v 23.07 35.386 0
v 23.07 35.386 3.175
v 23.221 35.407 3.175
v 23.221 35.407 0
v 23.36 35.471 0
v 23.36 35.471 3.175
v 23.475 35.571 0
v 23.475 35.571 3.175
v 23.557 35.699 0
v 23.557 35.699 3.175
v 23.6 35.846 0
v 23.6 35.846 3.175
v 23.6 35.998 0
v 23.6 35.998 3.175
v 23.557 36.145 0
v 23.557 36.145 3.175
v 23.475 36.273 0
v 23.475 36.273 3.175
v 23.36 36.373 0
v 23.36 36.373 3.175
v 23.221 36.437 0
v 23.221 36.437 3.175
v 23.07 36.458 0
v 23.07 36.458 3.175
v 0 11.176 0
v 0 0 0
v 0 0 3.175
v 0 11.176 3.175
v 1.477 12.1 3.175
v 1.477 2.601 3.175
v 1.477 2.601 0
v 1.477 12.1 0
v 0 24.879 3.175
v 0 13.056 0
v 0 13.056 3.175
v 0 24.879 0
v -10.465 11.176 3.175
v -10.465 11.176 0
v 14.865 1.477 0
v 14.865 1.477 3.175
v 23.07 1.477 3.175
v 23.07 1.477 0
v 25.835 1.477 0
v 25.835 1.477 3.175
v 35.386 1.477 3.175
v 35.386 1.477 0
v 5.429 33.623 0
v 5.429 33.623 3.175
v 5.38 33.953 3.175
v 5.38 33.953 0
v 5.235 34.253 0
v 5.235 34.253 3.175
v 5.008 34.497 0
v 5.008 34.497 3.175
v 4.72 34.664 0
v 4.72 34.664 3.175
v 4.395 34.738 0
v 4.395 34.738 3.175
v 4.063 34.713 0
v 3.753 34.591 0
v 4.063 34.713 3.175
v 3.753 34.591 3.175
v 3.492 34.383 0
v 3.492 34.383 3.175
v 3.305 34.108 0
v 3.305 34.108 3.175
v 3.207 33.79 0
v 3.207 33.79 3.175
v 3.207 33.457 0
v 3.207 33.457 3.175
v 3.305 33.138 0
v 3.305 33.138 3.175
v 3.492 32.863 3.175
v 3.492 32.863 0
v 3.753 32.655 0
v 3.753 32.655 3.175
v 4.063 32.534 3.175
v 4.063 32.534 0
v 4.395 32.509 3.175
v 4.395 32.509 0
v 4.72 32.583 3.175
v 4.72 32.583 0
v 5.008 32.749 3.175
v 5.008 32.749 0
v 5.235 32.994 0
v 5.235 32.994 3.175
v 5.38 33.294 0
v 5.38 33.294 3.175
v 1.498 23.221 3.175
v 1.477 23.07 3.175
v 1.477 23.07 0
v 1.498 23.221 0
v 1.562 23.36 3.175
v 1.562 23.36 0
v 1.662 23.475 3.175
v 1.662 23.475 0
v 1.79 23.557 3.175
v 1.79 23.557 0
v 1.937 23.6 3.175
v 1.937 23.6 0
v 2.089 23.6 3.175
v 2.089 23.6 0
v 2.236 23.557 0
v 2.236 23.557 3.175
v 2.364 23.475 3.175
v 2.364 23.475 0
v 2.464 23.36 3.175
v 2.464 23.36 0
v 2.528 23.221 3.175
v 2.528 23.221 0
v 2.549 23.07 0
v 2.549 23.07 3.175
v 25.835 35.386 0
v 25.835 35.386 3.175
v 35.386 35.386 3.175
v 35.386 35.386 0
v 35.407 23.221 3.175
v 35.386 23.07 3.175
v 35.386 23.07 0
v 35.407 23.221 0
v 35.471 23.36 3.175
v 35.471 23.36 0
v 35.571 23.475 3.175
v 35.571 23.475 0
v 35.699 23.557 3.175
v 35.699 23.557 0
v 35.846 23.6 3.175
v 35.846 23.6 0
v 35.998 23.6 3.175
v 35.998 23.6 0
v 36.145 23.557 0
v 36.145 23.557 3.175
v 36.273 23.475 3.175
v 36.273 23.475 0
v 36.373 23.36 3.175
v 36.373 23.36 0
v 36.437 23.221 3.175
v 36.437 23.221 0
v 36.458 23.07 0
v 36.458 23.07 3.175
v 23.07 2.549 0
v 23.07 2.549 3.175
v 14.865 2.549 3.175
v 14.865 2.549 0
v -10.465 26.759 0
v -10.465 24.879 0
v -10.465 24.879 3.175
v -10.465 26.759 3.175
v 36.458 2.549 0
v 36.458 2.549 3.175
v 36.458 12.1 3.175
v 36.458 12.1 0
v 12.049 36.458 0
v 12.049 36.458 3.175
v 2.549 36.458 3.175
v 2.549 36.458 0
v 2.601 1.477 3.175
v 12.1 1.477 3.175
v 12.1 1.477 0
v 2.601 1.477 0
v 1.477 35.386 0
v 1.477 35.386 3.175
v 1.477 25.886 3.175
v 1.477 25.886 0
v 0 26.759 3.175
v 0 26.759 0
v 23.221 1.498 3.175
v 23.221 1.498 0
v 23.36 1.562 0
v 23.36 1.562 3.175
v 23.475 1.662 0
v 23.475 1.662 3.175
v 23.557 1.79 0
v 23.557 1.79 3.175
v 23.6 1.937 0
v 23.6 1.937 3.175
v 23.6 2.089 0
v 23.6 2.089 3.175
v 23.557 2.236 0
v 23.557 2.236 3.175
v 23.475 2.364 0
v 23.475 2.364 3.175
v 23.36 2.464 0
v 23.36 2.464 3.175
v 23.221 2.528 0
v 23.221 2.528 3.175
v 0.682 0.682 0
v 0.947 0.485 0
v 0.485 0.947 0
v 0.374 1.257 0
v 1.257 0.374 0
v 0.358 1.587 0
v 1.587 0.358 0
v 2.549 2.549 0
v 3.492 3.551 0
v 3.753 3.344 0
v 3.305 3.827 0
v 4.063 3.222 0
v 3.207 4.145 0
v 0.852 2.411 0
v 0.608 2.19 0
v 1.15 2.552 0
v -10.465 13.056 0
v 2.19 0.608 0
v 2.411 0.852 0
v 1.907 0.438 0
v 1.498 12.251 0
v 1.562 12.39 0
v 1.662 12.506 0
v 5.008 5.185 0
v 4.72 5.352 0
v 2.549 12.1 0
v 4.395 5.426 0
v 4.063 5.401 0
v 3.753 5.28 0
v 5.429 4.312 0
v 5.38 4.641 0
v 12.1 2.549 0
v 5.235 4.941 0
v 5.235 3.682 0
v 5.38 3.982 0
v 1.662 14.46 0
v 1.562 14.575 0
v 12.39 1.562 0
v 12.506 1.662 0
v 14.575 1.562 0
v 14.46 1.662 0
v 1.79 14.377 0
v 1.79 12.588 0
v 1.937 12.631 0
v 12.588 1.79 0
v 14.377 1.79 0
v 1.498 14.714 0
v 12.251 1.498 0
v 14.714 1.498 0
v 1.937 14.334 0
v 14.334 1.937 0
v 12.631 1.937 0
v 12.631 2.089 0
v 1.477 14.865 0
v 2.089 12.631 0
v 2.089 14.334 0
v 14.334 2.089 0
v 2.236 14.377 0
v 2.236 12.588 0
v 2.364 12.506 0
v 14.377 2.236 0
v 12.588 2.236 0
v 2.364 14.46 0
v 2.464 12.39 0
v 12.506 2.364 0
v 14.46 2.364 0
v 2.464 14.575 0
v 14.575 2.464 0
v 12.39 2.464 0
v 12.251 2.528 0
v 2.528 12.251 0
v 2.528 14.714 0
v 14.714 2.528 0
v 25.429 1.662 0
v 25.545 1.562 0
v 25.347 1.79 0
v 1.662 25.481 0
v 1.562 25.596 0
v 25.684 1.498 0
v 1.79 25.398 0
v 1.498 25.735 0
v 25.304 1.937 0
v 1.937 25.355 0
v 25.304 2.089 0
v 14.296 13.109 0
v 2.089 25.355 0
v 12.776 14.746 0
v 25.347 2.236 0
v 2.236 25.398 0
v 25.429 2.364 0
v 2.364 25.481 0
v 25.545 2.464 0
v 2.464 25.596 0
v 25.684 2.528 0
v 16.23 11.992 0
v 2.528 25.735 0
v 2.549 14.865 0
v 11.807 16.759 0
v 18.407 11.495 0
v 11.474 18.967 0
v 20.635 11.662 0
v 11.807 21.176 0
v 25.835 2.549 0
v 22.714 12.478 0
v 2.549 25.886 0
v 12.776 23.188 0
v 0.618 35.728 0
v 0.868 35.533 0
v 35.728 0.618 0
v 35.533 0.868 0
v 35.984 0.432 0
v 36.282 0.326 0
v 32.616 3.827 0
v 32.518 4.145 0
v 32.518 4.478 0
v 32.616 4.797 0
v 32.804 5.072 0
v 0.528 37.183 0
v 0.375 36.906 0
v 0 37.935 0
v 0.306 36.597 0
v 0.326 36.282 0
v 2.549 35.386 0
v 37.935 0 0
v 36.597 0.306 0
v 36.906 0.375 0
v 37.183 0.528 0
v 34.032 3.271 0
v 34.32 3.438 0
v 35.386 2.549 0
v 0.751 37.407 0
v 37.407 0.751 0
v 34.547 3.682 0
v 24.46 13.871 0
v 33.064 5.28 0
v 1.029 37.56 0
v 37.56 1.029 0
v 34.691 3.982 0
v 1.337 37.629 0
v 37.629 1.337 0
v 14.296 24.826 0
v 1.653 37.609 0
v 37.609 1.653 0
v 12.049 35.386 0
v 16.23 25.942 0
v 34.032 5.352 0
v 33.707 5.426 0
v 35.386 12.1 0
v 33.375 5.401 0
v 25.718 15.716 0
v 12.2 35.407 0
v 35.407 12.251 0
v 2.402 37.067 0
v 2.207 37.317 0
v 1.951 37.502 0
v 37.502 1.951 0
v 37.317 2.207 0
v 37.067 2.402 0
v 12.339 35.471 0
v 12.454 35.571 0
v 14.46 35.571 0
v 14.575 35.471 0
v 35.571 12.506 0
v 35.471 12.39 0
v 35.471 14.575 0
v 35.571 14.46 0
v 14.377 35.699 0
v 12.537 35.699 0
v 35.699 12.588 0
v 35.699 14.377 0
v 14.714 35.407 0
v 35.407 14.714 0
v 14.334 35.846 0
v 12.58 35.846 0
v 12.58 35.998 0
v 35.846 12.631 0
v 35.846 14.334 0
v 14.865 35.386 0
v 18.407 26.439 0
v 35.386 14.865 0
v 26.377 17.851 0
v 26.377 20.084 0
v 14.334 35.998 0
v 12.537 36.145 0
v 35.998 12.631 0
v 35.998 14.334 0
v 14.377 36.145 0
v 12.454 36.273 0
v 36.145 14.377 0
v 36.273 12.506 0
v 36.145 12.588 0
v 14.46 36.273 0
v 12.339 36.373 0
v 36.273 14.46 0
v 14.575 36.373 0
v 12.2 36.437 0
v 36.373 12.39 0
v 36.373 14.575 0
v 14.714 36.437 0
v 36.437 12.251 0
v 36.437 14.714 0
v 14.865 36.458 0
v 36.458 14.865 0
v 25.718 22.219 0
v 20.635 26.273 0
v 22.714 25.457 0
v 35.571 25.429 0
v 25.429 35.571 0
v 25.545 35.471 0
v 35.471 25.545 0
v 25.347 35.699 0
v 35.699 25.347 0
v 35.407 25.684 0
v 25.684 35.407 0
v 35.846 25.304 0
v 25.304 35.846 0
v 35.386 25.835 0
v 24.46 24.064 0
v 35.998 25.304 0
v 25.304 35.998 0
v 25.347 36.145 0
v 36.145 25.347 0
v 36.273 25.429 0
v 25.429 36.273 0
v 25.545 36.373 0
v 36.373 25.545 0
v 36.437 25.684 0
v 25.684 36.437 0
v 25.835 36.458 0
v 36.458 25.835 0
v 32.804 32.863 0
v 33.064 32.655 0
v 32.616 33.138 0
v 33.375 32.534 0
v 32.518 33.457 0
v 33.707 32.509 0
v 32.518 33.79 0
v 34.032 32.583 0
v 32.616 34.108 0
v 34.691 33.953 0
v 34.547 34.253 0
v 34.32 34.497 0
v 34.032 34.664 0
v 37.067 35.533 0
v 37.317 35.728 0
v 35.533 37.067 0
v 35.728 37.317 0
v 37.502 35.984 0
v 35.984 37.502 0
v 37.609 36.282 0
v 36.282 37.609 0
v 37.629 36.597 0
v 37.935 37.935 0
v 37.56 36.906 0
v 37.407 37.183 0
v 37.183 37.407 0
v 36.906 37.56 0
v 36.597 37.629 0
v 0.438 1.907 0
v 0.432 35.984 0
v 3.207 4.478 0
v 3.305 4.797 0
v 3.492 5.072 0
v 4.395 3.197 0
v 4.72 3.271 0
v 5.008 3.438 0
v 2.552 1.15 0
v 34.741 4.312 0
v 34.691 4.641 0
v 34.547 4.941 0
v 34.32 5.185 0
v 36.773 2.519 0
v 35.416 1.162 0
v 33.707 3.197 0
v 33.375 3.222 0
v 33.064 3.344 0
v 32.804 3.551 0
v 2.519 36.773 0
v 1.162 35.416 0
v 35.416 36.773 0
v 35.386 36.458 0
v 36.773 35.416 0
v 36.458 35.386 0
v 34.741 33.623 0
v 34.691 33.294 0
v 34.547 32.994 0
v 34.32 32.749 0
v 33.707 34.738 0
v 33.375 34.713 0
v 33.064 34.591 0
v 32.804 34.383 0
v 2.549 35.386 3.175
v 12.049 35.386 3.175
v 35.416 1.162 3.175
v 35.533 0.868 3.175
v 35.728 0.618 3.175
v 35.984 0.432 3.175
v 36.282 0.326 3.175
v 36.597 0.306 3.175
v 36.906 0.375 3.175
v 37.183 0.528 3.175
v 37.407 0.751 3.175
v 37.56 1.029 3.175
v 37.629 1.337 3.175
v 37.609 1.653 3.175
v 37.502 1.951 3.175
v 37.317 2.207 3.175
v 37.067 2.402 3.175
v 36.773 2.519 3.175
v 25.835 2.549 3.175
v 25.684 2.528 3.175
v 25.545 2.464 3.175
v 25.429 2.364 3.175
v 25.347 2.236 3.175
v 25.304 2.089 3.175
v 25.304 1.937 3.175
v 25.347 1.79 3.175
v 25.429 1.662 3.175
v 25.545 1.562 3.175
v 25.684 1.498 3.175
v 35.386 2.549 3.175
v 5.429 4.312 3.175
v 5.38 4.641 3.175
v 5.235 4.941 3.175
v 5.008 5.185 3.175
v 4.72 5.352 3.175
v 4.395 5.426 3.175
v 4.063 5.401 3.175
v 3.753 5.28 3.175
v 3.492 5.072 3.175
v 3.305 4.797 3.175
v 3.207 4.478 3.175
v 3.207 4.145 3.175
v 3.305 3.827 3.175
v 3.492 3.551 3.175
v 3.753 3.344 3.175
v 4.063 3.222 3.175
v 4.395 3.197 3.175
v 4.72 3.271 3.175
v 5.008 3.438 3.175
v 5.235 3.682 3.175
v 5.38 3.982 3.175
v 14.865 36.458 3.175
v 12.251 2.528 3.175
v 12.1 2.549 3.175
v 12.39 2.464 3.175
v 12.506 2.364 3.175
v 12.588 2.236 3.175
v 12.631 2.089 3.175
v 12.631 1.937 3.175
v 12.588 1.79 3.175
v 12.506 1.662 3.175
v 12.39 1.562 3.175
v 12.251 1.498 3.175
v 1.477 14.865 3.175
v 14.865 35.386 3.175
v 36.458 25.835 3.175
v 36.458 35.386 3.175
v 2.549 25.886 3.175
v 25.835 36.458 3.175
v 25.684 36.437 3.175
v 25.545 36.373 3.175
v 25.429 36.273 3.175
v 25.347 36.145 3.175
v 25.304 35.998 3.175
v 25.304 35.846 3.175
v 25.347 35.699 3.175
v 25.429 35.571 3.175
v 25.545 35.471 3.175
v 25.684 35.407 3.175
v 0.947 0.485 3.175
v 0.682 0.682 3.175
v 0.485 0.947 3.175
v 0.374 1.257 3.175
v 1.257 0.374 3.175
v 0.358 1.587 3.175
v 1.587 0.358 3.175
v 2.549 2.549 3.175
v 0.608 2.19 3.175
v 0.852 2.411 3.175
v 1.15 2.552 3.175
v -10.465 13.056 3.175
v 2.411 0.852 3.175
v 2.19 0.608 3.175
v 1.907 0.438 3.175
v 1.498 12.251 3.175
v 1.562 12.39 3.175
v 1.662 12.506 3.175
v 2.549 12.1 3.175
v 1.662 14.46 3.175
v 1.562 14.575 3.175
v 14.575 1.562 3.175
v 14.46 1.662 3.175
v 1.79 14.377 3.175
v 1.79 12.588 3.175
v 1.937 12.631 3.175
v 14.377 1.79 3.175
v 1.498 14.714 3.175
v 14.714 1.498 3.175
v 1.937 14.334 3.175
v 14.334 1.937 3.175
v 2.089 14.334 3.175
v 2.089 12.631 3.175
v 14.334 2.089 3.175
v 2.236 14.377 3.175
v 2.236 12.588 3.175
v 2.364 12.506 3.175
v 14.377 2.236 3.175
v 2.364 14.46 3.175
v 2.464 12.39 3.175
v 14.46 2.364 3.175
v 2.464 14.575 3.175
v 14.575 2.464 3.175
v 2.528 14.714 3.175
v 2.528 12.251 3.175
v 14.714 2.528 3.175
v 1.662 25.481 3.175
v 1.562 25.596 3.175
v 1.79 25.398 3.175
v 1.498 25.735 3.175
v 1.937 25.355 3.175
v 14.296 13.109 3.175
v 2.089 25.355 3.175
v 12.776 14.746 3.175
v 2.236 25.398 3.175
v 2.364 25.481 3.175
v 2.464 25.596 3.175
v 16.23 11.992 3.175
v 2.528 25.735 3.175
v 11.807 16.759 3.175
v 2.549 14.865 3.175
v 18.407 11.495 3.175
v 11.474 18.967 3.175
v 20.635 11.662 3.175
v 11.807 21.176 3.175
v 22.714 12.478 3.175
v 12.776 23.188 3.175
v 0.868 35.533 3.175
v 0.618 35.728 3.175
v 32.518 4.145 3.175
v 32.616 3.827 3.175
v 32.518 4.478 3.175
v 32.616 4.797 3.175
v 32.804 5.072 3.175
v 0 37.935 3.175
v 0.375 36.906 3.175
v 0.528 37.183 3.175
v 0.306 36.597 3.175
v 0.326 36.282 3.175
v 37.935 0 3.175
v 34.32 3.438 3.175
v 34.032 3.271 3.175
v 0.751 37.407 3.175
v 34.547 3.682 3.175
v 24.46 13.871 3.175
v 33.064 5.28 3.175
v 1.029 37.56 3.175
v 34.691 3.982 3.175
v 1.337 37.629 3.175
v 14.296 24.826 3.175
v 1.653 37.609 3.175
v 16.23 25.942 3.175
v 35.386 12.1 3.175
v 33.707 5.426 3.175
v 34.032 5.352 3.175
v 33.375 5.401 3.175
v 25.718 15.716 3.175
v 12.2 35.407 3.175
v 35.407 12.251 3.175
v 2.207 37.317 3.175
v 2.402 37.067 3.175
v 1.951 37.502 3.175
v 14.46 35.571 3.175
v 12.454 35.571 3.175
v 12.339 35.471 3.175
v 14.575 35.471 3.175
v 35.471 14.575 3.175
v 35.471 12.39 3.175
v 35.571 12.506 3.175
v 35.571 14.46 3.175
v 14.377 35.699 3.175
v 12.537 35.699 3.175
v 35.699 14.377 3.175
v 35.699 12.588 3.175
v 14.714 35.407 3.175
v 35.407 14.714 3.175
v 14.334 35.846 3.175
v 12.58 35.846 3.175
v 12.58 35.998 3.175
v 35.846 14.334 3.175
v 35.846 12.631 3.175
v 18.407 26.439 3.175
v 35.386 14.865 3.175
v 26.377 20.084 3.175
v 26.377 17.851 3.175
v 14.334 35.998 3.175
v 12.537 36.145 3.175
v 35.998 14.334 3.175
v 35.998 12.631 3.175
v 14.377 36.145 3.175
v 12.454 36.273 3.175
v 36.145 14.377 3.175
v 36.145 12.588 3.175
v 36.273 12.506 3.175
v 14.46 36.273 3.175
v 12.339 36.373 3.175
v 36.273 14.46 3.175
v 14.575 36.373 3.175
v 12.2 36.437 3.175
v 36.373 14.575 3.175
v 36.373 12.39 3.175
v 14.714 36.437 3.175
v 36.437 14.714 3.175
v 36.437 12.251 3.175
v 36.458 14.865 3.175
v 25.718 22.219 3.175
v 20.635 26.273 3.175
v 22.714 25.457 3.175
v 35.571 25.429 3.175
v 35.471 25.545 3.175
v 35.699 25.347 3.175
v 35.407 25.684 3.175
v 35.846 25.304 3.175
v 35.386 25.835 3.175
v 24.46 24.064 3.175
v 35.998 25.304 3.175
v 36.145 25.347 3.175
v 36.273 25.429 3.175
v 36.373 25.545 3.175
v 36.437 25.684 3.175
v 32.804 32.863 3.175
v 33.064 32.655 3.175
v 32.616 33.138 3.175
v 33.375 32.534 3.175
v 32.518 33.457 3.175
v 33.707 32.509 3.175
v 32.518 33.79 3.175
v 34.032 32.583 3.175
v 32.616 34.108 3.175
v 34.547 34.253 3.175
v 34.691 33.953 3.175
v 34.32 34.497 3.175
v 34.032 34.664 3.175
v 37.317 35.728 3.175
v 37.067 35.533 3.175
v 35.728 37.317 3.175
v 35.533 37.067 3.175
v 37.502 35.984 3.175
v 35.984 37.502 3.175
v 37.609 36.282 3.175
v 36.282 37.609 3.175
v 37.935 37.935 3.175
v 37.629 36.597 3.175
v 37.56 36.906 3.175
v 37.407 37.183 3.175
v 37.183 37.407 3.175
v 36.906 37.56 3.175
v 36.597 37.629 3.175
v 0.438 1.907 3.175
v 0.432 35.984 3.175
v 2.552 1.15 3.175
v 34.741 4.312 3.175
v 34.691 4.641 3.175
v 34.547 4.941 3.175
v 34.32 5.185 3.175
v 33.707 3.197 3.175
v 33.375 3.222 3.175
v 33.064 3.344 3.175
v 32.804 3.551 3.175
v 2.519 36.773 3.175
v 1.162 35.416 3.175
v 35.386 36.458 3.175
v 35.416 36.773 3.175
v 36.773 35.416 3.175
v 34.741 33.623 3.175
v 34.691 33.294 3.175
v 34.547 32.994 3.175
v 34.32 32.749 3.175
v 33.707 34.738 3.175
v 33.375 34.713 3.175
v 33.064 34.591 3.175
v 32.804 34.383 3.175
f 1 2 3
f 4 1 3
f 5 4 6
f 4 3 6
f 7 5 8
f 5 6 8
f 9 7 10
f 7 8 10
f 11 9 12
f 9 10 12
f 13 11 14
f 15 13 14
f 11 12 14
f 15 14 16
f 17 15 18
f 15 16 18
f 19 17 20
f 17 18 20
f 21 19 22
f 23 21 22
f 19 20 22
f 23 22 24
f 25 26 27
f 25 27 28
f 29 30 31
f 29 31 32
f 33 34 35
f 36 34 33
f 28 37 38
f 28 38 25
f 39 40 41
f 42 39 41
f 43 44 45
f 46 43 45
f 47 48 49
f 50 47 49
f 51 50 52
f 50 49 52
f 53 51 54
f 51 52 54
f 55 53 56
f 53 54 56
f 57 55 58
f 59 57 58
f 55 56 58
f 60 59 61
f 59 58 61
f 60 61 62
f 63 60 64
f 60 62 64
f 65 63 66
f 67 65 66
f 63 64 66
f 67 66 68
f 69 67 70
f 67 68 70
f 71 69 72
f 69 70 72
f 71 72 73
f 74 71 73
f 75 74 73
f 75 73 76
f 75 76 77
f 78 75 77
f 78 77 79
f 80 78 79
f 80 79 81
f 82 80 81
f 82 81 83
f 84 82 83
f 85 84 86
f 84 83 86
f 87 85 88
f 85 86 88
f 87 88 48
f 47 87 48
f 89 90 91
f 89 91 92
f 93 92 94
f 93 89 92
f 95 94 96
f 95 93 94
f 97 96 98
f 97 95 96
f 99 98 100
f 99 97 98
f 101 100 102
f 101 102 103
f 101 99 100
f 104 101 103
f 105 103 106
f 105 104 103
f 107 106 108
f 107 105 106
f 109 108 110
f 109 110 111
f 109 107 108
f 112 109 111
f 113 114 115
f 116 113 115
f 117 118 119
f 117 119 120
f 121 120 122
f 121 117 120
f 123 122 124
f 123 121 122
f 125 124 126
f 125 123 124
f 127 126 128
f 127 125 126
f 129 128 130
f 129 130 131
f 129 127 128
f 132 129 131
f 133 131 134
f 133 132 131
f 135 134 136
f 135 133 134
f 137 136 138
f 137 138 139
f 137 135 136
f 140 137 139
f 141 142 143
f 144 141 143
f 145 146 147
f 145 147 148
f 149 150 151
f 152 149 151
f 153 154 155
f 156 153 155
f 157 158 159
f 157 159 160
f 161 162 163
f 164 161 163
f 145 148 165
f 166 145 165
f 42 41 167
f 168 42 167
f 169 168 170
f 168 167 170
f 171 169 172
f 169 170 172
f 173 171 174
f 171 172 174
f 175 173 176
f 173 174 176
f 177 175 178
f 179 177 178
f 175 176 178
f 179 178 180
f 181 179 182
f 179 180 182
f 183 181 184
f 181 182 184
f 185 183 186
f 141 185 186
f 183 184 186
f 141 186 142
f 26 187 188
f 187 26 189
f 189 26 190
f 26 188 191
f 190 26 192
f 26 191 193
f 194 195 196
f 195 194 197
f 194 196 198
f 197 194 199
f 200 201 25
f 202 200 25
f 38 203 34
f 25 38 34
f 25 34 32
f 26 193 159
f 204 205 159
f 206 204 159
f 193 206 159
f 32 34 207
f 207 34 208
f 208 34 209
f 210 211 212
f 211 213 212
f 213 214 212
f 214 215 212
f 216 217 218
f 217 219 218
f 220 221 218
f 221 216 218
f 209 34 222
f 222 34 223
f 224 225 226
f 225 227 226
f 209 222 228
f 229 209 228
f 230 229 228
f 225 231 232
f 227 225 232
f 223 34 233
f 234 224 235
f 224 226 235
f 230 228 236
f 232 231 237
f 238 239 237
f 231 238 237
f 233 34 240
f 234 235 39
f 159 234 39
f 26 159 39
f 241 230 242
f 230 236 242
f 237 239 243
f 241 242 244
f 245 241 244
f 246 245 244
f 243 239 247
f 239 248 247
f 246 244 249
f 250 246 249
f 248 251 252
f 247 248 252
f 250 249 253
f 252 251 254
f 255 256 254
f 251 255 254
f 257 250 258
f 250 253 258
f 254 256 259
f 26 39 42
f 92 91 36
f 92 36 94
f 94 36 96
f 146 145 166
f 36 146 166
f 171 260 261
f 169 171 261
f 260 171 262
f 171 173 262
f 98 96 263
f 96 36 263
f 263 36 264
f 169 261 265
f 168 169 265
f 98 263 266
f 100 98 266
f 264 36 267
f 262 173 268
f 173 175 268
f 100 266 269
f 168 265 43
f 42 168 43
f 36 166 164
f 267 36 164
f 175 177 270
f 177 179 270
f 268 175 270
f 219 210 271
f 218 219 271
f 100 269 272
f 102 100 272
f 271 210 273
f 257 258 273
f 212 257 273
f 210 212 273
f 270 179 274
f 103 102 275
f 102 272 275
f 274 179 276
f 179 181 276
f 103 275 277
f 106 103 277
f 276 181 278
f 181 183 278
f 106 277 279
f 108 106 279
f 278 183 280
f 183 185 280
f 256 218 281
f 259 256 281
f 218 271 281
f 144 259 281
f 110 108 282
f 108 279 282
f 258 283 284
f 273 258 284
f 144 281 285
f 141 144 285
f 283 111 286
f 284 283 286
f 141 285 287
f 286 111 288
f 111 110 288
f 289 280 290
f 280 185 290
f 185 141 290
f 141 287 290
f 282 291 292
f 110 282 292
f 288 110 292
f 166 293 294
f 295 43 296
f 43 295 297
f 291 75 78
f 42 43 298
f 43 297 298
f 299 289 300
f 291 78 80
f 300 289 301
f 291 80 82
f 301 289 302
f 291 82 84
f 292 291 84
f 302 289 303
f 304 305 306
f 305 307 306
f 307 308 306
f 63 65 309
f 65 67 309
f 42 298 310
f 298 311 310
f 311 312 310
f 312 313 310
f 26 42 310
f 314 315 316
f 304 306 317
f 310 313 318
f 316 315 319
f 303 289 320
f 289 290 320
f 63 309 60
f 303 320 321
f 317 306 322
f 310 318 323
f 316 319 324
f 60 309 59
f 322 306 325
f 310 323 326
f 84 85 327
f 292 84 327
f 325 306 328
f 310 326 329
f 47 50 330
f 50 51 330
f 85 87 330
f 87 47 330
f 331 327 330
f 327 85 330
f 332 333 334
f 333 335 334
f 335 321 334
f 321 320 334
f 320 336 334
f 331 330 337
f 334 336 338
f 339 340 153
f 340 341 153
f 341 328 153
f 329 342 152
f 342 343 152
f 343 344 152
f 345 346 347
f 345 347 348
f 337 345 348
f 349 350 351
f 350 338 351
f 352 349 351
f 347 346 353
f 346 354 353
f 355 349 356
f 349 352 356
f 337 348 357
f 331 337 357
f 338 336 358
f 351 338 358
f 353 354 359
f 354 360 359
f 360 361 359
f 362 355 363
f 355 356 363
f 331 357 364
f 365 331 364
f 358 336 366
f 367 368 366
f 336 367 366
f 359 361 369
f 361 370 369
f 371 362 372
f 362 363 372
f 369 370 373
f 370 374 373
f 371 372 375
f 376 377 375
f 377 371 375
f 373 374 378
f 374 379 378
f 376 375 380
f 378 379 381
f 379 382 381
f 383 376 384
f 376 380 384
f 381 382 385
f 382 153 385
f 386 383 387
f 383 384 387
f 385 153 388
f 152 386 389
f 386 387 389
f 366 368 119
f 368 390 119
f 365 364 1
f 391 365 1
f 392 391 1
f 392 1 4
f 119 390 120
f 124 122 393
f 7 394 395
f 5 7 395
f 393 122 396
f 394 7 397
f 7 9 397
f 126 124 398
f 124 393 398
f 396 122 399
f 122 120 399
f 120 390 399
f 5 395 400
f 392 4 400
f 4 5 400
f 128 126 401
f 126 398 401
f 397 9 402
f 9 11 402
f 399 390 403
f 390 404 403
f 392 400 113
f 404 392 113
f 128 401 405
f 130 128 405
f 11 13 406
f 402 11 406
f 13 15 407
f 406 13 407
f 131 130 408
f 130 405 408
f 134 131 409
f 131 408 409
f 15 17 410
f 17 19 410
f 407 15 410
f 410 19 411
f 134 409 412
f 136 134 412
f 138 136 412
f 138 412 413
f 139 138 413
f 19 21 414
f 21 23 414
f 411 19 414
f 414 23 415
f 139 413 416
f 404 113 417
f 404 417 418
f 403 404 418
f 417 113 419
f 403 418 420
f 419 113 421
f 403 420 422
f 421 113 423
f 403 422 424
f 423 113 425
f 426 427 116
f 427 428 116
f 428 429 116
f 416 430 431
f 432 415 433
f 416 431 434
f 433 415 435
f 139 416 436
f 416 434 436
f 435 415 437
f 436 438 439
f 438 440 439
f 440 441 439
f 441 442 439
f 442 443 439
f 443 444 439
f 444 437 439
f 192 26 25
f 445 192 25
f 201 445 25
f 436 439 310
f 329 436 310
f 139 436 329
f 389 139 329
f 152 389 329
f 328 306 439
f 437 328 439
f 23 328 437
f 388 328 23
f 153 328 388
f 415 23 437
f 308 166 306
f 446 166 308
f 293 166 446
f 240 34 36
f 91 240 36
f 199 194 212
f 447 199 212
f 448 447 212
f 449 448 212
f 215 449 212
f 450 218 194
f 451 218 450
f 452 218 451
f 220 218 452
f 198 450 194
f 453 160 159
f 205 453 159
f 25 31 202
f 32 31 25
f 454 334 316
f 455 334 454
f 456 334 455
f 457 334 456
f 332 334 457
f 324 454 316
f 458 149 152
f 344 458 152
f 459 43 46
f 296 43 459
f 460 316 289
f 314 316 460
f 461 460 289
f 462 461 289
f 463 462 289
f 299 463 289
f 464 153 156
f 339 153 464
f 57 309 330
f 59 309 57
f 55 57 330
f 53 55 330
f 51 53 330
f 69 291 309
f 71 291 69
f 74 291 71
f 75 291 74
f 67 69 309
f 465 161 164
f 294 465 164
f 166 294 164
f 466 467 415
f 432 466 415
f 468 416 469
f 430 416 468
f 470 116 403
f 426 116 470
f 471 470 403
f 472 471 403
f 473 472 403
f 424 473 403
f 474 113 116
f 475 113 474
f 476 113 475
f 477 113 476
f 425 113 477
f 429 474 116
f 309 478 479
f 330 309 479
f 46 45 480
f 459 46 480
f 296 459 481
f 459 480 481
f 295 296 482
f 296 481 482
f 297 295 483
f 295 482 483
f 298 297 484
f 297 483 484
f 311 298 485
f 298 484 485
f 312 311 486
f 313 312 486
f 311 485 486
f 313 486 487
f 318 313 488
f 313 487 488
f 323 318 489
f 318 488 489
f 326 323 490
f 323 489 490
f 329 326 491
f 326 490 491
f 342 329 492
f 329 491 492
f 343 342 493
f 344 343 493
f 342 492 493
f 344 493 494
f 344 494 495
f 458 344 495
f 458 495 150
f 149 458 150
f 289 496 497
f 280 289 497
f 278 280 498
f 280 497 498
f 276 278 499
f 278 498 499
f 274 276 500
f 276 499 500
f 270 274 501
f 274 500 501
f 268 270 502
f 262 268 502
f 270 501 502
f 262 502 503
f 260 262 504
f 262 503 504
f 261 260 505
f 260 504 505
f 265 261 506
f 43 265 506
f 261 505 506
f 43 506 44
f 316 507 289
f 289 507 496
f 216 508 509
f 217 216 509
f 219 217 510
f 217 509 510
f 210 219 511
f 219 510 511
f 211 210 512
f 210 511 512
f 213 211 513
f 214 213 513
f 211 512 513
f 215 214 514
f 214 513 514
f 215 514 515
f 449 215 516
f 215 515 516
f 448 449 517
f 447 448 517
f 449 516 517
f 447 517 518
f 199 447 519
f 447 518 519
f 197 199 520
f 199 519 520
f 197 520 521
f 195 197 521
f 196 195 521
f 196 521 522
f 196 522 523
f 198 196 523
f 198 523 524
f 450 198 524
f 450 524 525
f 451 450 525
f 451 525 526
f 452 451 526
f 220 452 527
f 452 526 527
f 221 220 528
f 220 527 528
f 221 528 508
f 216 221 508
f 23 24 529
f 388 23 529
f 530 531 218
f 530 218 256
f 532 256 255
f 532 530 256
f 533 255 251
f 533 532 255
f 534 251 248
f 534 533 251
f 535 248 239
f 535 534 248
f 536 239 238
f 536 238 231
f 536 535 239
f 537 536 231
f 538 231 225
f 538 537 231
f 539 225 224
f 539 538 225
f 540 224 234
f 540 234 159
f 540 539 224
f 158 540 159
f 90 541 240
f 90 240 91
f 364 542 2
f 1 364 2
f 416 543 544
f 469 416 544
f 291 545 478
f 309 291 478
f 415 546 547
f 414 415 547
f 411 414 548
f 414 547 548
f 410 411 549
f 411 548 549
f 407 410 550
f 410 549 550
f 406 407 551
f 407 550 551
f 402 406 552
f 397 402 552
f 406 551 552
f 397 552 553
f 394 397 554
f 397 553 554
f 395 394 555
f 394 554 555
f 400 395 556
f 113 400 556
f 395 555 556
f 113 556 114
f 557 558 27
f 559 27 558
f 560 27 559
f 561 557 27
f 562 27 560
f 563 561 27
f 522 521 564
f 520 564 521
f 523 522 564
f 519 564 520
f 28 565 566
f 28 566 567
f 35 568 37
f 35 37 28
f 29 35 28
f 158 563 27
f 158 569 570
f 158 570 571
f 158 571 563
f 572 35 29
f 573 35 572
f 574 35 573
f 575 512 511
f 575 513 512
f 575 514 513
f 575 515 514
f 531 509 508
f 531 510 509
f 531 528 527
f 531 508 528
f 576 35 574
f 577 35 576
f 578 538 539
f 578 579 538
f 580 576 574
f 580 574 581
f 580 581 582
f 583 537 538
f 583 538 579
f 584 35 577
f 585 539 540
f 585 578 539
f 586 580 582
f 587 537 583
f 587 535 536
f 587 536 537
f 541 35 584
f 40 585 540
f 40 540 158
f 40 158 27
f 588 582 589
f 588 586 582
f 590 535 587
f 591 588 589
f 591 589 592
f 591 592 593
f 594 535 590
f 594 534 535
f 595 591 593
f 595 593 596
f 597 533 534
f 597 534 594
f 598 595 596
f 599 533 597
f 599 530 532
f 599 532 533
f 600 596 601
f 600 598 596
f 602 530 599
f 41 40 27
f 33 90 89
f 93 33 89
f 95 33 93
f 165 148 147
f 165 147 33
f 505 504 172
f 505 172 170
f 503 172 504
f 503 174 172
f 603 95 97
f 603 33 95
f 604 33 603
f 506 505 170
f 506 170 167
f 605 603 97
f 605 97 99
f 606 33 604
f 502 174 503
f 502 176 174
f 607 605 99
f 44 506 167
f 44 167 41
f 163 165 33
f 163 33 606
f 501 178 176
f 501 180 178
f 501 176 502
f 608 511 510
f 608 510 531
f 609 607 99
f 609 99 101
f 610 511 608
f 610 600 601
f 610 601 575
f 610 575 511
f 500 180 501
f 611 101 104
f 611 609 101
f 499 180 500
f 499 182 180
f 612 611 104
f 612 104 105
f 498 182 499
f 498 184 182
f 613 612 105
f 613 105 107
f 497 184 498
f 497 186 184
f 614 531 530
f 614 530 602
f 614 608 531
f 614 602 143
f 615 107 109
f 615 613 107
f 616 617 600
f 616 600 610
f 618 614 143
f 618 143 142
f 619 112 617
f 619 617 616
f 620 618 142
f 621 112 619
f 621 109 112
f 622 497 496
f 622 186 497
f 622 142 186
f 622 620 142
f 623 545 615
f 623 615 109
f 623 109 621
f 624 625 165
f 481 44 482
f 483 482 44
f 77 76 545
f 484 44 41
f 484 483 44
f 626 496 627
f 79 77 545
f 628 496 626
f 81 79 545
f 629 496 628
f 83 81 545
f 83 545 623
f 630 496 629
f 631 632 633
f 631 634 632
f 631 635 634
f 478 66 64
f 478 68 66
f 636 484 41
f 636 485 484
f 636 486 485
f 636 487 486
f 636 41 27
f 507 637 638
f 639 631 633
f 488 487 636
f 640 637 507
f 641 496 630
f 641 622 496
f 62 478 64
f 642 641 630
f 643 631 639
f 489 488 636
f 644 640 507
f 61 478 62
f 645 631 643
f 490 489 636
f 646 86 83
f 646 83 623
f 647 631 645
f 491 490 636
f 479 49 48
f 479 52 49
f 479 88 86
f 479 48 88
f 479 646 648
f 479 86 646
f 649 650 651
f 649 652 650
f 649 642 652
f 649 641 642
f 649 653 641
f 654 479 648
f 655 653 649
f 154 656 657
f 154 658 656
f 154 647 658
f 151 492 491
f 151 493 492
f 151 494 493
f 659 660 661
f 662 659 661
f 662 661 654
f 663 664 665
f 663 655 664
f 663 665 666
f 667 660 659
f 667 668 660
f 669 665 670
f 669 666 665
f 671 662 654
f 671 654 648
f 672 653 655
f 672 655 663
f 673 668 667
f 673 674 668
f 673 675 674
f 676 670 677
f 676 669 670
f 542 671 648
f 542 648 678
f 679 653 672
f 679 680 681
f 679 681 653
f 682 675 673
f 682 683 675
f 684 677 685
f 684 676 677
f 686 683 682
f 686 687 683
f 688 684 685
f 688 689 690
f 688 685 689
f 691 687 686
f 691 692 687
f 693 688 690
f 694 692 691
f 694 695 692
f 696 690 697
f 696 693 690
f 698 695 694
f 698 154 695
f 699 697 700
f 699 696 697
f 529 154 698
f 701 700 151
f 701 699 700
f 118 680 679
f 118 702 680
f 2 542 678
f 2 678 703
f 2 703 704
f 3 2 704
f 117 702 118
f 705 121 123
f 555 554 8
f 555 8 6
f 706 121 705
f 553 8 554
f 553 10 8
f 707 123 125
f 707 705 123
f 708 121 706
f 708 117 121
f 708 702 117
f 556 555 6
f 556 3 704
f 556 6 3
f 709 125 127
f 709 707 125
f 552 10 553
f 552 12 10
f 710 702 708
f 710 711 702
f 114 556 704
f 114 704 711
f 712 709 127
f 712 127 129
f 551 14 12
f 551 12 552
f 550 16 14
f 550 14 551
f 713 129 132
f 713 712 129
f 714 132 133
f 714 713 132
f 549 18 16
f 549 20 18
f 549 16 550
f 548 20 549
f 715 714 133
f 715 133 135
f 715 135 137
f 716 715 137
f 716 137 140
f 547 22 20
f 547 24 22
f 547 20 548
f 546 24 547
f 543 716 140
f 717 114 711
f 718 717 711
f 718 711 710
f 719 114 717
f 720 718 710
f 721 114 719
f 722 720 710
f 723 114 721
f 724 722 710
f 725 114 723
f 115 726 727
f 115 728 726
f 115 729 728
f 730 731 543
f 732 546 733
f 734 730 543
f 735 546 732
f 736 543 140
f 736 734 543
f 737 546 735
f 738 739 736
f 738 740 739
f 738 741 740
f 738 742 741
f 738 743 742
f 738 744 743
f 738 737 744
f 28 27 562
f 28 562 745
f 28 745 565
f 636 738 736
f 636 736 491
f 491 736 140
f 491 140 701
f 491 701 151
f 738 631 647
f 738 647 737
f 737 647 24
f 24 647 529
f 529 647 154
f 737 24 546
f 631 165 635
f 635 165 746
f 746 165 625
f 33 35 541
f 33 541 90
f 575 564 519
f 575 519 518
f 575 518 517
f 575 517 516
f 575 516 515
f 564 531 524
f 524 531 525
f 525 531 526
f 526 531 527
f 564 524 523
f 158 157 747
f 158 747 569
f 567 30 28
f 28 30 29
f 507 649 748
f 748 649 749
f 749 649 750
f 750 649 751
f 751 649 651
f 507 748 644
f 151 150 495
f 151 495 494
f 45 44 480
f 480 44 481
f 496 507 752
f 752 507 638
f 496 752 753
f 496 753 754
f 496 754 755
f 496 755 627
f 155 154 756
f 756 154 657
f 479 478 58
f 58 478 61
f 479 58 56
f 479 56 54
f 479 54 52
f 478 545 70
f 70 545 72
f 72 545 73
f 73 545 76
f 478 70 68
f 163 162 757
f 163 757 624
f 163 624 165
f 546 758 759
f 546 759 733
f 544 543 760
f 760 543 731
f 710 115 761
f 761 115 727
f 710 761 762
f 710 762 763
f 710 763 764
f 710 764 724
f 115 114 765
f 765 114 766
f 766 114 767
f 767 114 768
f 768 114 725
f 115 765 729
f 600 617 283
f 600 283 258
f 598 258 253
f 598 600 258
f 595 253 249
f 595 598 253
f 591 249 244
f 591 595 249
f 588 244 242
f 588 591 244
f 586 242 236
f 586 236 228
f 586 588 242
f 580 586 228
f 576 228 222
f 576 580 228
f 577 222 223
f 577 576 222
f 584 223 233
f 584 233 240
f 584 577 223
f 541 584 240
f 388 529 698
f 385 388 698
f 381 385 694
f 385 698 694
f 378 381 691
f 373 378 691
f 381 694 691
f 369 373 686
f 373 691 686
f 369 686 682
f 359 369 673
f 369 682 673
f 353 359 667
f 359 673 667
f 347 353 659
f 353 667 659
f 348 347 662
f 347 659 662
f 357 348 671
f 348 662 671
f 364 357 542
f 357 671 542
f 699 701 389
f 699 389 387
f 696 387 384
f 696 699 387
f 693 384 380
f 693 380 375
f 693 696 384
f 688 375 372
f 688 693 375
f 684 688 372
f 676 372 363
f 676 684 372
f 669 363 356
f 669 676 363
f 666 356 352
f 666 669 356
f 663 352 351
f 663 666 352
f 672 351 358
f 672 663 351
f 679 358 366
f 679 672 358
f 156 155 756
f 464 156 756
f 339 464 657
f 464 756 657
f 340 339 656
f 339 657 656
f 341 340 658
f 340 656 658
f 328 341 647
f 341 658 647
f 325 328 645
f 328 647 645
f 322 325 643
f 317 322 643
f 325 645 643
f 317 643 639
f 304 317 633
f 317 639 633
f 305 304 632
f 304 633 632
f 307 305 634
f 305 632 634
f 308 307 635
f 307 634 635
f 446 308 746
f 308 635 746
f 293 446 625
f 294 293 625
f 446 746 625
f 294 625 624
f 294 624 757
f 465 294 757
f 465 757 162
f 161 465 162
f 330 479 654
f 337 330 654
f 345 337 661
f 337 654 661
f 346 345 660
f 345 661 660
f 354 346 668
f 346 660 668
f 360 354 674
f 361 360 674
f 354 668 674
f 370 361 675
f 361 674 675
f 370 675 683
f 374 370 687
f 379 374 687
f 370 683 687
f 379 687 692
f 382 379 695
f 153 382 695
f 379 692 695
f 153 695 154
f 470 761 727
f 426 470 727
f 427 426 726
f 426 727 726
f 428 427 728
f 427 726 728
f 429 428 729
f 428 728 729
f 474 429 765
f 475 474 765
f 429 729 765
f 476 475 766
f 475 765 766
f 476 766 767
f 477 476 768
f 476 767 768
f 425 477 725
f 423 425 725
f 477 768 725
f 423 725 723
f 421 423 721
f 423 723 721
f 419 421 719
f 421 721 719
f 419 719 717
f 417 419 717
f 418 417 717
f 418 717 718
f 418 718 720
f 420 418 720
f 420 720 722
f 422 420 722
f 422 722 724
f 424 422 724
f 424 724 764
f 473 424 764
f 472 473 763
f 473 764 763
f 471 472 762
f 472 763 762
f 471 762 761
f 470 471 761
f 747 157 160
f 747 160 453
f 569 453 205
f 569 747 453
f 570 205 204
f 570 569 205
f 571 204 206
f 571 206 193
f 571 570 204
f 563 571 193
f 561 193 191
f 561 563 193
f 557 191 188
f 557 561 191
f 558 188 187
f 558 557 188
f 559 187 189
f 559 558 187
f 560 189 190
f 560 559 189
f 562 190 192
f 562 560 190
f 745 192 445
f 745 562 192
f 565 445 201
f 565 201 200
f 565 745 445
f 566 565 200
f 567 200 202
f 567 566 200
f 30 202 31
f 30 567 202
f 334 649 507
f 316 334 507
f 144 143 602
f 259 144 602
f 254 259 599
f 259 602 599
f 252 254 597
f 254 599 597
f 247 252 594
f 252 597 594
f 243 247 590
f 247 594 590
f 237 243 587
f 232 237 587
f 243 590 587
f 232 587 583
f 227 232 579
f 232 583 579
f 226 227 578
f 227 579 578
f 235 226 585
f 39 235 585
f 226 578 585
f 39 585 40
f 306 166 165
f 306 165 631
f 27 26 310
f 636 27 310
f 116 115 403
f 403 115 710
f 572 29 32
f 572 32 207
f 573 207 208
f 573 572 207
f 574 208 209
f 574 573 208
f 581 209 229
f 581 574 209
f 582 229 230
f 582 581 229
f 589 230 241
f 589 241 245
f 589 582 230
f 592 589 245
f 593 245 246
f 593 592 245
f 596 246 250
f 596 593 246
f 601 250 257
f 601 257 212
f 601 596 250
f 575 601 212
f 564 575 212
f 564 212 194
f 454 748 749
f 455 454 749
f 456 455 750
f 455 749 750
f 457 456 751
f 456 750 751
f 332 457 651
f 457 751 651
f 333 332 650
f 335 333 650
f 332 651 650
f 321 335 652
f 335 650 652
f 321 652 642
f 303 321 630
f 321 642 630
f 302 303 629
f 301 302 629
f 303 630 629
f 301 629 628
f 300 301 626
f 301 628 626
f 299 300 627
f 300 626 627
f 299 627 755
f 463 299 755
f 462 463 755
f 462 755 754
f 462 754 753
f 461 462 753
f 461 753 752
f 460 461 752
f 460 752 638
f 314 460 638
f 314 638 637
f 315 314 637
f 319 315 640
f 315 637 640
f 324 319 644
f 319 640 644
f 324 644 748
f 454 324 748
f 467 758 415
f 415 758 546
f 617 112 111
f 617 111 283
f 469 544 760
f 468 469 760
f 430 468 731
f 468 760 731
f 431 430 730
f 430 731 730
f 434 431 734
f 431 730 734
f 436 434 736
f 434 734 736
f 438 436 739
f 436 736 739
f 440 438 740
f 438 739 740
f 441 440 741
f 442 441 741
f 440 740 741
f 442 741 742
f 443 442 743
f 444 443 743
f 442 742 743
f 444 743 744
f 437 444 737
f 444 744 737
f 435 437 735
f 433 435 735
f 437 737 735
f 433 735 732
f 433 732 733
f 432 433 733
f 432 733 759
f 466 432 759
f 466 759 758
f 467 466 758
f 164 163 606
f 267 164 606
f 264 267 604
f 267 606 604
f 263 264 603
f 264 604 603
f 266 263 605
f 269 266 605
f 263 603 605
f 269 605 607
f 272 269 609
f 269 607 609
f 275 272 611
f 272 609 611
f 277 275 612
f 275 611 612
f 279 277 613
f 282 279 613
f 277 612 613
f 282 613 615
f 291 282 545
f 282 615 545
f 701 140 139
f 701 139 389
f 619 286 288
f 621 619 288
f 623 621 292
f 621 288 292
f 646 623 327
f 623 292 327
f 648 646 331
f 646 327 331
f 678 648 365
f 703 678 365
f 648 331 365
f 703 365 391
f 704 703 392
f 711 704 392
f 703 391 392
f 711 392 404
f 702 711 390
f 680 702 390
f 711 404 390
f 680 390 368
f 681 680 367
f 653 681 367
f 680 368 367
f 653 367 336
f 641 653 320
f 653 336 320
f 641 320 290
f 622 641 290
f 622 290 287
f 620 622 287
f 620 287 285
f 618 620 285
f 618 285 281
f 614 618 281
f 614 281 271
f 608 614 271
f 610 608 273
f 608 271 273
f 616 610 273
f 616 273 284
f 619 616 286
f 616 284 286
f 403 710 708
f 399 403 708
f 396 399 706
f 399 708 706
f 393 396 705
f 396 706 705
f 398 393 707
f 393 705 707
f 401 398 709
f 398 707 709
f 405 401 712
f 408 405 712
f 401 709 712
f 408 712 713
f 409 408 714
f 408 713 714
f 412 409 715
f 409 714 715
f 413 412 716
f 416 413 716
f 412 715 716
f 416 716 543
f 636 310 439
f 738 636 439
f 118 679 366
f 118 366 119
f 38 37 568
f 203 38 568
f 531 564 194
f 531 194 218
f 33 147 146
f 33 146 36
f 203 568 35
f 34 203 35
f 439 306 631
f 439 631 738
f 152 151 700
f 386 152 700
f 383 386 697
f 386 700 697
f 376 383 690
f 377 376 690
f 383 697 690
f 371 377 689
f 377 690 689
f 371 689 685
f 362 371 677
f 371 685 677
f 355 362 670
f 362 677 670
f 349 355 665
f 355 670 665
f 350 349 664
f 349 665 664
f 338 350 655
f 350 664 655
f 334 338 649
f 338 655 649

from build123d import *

# Parameters (mm, degrees)
SKETCH1_W           = 37.9349
SKETCH1_H           = 37.9349
BOSS_EXTRUDE1_DEPTH = 3.175
SKETCH9_R           = 1.1176
CUT_EXTRUDE2_DEPTH  = 3.175
SKETCH10_R          = 7.493
CUT_EXTRUDE3_DEPTH  = 3.175
SKETCH11_W          = 10.4648
SKETCH11_H          = 1.8796
BOSS_EXTRUDE2_DEPTH = 3.175


with BuildPart() as part:
    # Sketch1 → Boss-Extrude1 (new body)
    with BuildSketch(Plane.XY):
        with Locations((18.96745, 18.96745)):
            Rectangle(SKETCH1_W, SKETCH1_H)
    extrude(amount=BOSS_EXTRUDE1_DEPTH)

    # Sketch9 → Cut-Extrude2 (cut)
    with BuildSketch(Plane.XY.offset(3.175)):
        with Locations((33.62325, 33.62325)):
            Circle(SKETCH9_R)
        with Locations((4.31165, 33.62325)):
            Circle(SKETCH9_R)
        with Locations((4.31165, 4.31165)):
            Circle(SKETCH9_R)
        with Locations((33.62325, 4.31165)):
            Circle(SKETCH9_R)
        with BuildLine():
            Line((35.385619933, 12.100169933), (35.385619933, 2.549280067))
            Line((35.385619933, 2.549280067), (25.834730067, 2.549280067))
            ThreePointArc((25.834730067, 2.549280067), (25.2984, 2.01295), (25.834730067, 1.476619933))
            Line((25.834730067, 1.476619933), (35.385619933, 1.476619933))
            ThreePointArc((35.385619933, 1.476619933), (37.303202335, 0.631697665), (36.458280067, 2.549280067))
            Line((36.458280067, 2.549280067), (36.458280067, 12.100169933))
            ThreePointArc((36.458280067, 12.100169933), (35.92195, 12.6365), (35.385619933, 12.100169933))
        make_face()
        with BuildLine():
            Line((35.385619933, 36.458280067), (25.834730067, 36.458280067))
            ThreePointArc((25.834730067, 36.458280067), (25.2984, 35.92195), (25.834730067, 35.385619933))
            Line((25.834730067, 35.385619933), (35.385619933, 35.385619933))
            Line((35.385619933, 35.385619933), (35.385619933, 25.834730067))
            ThreePointArc((35.385619933, 25.834730067), (35.92195, 25.2984), (36.458280067, 25.834730067))
            Line((36.458280067, 25.834730067), (36.458280067, 35.385619933))
            ThreePointArc((36.458280067, 35.385619933), (37.303202335, 37.303202335), (35.385619933, 36.458280067))
        make_face()
        with BuildLine():
            Line((12.048880067, 36.458280067), (2.549280067, 36.458280067))
            ThreePointArc((2.549280067, 36.458280067), (0.631697665, 37.303202335), (1.476619933, 35.385619933))
            Line((1.476619933, 35.385619933), (1.476619933, 25.886019933))
            ThreePointArc((1.476619933, 25.886019933), (2.01295, 25.349689867), (2.549280067, 25.886019933))
            Line((2.549280067, 25.886019933), (2.549280067, 35.385619933))
            Line((2.549280067, 35.385619933), (12.048880067, 35.385619933))
            ThreePointArc((12.048880067, 35.385619933), (12.585210133, 35.92195), (12.048880067, 36.458280067))
        make_face()
        with BuildLine():
            Line((23.06955, 36.458280067), (14.86535, 36.458280067))
            ThreePointArc((14.86535, 36.458280067), (14.329019933, 35.92195), (14.86535, 35.385619933))
            Line((14.86535, 35.385619933), (23.06955, 35.385619933))
            ThreePointArc((23.06955, 35.385619933), (23.605880067, 35.92195), (23.06955, 36.458280067))
        make_face()
        with BuildLine():
            Line((2.549280067, 23.06955), (2.549280067, 14.86535))
            ThreePointArc((2.549280067, 14.86535), (2.01295, 14.329019933), (1.476619933, 14.86535))
            Line((1.476619933, 14.86535), (1.476619933, 23.06955))
            ThreePointArc((1.476619933, 23.06955), (2.01295, 23.605880067), (2.549280067, 23.06955))
        make_face()
        with BuildLine():
            Line((36.458280067, 23.06955), (36.458280067, 14.86535))
            ThreePointArc((36.458280067, 14.86535), (35.92195, 14.329019933), (35.385619933, 14.86535))
            Line((35.385619933, 14.86535), (35.385619933, 23.06955))
            ThreePointArc((35.385619933, 23.06955), (35.92195, 23.605880067), (36.458280067, 23.06955))
        make_face()
        with BuildLine():
            Line((23.06955, 2.549280067), (14.86535, 2.549280067))
            ThreePointArc((14.86535, 2.549280067), (14.329019933, 2.01295), (14.86535, 1.476619933))
            Line((14.86535, 1.476619933), (23.06955, 1.476619933))
            ThreePointArc((23.06955, 1.476619933), (23.605880067, 2.01295), (23.06955, 2.549280067))
        make_face()
        with BuildLine():
            Line((2.549280067, 12.100169933), (2.549280067, 2.549280067))
            Line((2.549280067, 2.549280067), (12.100169933, 2.549280067))
            ThreePointArc((12.100169933, 2.549280067), (12.6365, 2.01295), (12.100169933, 1.476619933))
            Line((12.100169933, 1.476619933), (2.600569933, 1.476619933))
            ThreePointArc((2.600569933, 1.476619933), (0.681867267, 0.681867267), (1.476619933, 2.600569933))
            Line((1.476619933, 2.600569933), (1.476619933, 12.100169933))
            ThreePointArc((1.476619933, 12.100169933), (2.01295, 12.6365), (2.549280067, 12.100169933))
        make_face()
    extrude(amount=-CUT_EXTRUDE2_DEPTH, mode=Mode.SUBTRACT)

    # Sketch10 → Cut-Extrude3 (cut)
    with BuildSketch(Plane(origin=(0, 0, 0), x_dir=(-1, 0, 0), z_dir=(0, 0, -1))):
        with Locations((-18.96745, 18.96745)):
            Circle(SKETCH10_R)
    extrude(amount=-CUT_EXTRUDE3_DEPTH, mode=Mode.SUBTRACT)

    # Sketch11 → Boss-Extrude2 (add)
    with BuildSketch(Plane.XY.offset(3.175)):
        with Locations((-5.2324, 25.8191)):
            Rectangle(SKETCH11_W, SKETCH11_H)
        with Locations((-5.2324, 12.1158)):
            Rectangle(SKETCH11_W, SKETCH11_H)
    extrude(amount=-BOSS_EXTRUDE2_DEPTH)


solid = part.part
